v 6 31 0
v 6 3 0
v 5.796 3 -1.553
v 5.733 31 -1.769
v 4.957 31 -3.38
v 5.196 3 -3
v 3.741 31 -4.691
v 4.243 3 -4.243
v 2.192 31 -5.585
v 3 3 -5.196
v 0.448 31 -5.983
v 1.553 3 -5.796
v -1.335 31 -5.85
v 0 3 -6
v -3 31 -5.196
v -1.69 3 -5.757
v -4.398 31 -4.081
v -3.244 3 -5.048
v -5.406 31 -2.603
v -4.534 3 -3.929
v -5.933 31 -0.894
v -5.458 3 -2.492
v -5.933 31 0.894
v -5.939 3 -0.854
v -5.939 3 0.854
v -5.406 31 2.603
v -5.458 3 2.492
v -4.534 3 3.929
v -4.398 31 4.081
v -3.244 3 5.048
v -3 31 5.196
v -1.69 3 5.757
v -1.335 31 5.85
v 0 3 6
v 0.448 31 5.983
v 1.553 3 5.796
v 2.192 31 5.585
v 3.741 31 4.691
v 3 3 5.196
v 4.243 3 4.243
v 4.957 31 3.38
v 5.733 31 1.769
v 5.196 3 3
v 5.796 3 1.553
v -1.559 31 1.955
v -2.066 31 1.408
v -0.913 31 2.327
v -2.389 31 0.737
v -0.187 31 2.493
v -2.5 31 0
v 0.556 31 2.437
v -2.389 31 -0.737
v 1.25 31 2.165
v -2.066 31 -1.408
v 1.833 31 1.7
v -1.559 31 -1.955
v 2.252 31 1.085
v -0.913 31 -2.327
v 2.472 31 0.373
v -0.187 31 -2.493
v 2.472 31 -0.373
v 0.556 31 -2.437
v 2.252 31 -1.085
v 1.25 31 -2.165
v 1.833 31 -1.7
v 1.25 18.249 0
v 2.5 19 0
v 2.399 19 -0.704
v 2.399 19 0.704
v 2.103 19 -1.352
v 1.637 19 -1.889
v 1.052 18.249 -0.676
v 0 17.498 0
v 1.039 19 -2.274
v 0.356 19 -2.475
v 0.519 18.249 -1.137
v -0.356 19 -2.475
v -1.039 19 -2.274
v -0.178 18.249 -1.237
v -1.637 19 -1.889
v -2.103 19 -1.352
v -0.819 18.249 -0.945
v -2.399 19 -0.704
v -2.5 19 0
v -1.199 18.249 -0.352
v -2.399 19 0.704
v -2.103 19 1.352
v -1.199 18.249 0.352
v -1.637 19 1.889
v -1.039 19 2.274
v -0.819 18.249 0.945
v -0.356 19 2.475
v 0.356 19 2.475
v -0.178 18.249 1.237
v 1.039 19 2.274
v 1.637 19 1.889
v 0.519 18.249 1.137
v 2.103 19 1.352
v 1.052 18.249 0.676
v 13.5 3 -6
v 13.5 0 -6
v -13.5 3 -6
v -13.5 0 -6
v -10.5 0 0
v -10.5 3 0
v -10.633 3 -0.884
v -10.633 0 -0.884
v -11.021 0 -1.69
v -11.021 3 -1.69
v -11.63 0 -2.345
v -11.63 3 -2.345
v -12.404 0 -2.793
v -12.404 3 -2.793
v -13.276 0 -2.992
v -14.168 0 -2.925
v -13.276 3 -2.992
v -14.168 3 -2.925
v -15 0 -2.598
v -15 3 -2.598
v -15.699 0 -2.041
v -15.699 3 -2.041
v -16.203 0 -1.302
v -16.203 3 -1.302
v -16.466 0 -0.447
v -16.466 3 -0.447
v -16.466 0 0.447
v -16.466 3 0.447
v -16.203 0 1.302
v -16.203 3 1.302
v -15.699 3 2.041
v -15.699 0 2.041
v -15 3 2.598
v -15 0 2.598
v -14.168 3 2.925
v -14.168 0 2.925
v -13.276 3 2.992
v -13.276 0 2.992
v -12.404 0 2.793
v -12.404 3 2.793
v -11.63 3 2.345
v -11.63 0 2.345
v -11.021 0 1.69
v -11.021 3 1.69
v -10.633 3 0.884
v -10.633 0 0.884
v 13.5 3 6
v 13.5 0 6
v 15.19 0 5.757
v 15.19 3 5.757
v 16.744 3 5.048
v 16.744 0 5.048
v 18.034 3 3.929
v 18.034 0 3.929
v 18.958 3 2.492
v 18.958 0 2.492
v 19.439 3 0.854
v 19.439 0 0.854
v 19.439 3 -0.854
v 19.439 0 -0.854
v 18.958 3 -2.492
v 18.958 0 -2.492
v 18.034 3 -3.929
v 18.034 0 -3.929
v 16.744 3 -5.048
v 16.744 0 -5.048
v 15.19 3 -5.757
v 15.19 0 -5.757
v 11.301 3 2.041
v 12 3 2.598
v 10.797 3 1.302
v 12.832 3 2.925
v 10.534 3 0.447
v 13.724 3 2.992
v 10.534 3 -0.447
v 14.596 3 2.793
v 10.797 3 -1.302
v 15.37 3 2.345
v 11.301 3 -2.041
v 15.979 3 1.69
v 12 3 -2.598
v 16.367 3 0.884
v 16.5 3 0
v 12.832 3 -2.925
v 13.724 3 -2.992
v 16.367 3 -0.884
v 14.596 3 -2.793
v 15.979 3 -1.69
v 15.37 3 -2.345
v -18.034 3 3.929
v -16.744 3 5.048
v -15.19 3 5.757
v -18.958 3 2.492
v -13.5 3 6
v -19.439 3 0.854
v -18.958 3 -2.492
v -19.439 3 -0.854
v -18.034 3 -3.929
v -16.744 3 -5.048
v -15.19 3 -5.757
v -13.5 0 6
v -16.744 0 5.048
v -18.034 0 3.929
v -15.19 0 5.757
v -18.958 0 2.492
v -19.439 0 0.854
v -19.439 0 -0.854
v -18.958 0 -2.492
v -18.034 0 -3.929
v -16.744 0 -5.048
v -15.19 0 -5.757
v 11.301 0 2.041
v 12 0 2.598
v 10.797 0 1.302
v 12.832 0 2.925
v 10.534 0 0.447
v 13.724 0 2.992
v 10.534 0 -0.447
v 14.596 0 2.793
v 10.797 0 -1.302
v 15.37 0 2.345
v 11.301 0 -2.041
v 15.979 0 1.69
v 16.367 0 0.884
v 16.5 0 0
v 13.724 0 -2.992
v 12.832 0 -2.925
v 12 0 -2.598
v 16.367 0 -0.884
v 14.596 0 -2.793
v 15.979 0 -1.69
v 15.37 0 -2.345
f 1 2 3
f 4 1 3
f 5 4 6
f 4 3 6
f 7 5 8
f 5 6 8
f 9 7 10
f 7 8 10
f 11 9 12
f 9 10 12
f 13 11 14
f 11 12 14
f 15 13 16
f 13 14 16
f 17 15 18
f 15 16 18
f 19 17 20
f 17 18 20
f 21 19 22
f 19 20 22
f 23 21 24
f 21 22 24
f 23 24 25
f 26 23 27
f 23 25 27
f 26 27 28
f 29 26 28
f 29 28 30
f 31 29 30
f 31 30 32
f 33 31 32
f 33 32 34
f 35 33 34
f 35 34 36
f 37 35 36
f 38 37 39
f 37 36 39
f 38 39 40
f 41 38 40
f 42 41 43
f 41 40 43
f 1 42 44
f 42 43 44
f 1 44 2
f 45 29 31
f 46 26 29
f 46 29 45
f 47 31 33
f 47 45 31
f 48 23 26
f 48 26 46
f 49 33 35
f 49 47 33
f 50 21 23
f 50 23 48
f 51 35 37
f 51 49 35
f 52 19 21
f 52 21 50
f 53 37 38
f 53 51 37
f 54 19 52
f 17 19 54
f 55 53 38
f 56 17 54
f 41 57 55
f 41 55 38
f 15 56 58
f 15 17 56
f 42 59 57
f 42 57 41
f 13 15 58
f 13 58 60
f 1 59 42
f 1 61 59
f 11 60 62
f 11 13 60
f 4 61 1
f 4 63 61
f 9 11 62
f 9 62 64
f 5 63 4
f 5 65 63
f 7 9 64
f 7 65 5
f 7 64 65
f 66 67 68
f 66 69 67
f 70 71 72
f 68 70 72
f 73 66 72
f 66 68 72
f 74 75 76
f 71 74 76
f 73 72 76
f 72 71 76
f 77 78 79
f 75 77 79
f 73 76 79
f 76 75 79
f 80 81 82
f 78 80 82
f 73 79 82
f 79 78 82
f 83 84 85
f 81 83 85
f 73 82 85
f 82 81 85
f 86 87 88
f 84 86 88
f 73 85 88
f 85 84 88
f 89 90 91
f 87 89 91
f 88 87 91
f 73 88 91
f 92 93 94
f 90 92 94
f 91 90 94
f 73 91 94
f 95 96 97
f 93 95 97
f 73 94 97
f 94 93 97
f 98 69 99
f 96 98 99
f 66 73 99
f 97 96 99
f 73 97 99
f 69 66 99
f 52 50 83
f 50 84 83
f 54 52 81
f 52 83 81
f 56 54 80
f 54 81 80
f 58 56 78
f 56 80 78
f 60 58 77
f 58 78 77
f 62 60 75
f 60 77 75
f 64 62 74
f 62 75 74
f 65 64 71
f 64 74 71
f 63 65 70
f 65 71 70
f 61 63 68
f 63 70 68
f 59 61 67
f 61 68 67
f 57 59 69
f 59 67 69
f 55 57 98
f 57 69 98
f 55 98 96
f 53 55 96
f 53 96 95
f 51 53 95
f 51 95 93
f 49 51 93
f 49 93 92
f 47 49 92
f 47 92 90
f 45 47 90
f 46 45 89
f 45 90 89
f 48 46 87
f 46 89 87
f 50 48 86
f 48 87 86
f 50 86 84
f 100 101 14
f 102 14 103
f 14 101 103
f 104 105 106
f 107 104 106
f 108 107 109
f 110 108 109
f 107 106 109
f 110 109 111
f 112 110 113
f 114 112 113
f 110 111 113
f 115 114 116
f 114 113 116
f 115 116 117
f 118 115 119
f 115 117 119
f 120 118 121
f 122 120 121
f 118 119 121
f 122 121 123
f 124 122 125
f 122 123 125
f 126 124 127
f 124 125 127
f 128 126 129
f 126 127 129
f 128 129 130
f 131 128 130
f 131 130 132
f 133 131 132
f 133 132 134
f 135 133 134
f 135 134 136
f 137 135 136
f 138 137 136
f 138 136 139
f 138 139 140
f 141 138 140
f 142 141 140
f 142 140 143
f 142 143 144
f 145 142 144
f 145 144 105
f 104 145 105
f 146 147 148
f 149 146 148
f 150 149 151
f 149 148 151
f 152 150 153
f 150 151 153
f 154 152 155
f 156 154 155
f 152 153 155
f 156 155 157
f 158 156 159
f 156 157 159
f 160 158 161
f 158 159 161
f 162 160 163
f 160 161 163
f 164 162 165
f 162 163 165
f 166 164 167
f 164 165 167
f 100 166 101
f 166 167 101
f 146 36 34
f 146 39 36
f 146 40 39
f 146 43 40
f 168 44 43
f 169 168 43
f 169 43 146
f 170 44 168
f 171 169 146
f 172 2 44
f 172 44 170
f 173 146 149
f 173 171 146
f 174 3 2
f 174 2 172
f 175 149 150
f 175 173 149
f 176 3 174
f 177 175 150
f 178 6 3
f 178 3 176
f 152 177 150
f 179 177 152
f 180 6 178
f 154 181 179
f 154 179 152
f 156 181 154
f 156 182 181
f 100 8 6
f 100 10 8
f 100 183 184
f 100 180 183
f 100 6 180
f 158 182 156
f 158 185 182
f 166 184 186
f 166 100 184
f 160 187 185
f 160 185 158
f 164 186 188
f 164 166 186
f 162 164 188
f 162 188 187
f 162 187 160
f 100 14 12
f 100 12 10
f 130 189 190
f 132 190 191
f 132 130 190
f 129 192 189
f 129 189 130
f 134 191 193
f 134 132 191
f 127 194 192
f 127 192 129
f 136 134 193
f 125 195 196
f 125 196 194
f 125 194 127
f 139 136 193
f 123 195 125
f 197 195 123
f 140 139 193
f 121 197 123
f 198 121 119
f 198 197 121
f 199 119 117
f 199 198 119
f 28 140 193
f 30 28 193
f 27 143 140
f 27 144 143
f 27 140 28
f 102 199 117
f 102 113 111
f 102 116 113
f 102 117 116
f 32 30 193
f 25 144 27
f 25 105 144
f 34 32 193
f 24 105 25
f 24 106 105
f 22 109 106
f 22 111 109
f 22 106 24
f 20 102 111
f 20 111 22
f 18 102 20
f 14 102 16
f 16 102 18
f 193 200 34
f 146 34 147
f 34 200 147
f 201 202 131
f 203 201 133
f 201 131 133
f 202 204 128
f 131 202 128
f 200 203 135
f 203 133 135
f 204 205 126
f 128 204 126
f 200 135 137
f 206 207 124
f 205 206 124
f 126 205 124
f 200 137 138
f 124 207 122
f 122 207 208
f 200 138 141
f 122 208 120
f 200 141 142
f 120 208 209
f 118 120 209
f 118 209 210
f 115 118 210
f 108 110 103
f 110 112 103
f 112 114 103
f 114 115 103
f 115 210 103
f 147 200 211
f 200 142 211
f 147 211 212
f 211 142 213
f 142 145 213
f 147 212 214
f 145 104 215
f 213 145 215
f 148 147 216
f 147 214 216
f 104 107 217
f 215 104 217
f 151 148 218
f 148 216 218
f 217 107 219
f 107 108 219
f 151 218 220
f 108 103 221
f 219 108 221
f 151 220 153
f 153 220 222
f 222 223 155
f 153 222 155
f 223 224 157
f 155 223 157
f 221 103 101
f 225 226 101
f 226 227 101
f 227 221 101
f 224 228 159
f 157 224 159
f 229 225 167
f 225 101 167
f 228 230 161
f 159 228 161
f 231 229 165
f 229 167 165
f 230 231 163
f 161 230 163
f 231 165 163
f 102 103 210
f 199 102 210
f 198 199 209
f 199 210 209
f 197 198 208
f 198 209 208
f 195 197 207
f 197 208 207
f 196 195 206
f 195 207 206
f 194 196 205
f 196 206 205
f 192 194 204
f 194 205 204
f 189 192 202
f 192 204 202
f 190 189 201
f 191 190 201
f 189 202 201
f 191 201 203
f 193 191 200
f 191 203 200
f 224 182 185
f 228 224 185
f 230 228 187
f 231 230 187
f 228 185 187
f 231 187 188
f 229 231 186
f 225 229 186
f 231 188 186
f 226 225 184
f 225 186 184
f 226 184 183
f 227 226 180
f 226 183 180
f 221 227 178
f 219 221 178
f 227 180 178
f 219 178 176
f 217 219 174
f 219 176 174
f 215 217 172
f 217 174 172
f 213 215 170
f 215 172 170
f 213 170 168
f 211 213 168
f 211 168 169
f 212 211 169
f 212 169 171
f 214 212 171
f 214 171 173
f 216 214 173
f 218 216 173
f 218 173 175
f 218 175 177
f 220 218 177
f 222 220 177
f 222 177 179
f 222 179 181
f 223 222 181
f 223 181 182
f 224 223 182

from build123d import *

# Parameters (mm, degrees)
SKETCH_1_R             = 6
EXTRUDE_1_DEPTH        = 3
SKETCH_2_R             = 6
EXTRUDE_2_DEPTH        = 28
HOLE_WIZARD_M6_1_D     = 5
HOLE_WIZARD_M6_1_DEPTH = 12
HOLE_WIZARD_M6_1_TIP   = 1.502151548
SKETCH_6_R             = 3
CUT_EXTRUDE_1_DEPTH    = 10


with BuildPart() as part:
    # 草图1 → 凸台-拉伸1 (new body)
    with BuildSketch(Plane(origin=(0, 0, 0), x_dir=(1, 0, 0), z_dir=(0, 1, 0))):
        with Locations((-13.5, 0)):
            Circle(SKETCH_1_R)
        with BuildLine():
            Line((13.5, 6), (-13.5, 6))
            ThreePointArc((-13.5, 6), (-9.257359313, 4.242640687), (-7.5, 0))
            ThreePointArc((-7.5, 0), (-9.257359313, -4.242640687), (-13.5, -6))
            Line((-13.5, -6), (13.5, -6))
            ThreePointArc((13.5, -6), (7.5, 0), (13.5, 6))
        make_face()
        with Locations((13.5, 0)):
            Circle(SKETCH_1_R)
    extrude(amount=EXTRUDE_1_DEPTH)

    # 草图2 → 凸台-拉伸2 (add)
    with BuildSketch(Plane(origin=(0, 3, 0), x_dir=(1, 0, 0), z_dir=(0, 1, 0))):
        Circle(SKETCH_2_R)
    extrude(amount=EXTRUDE_2_DEPTH)

    # M6 螺纹孔1
    with Locations(Plane(origin=(0, 31, 0), x_dir=(1, 0, 0), z_dir=(0, 1, 0))):
        with Locations((0, 0)):
            Hole(HOLE_WIZARD_M6_1_D / 2, depth=HOLE_WIZARD_M6_1_DEPTH)
            with Locations((0, 0, -(HOLE_WIZARD_M6_1_DEPTH + HOLE_WIZARD_M6_1_TIP / 2))):  # 118° drill point
                Cone(0, HOLE_WIZARD_M6_1_D / 2, HOLE_WIZARD_M6_1_TIP, mode=Mode.SUBTRACT)

    # 草图6 → 切除-拉伸1 (cut)
    with BuildSketch(Plane(origin=(0, 3, 0), x_dir=(1, 0, 0), z_dir=(0, 1, 0))):
        with Locations((-13.5, 0)):
            Circle(SKETCH_6_R)
        with Locations((13.5, 0)):
            Circle(SKETCH_6_R)
    extrude(amount=-CUT_EXTRUDE_1_DEPTH, mode=Mode.SUBTRACT)


solid = part.part
